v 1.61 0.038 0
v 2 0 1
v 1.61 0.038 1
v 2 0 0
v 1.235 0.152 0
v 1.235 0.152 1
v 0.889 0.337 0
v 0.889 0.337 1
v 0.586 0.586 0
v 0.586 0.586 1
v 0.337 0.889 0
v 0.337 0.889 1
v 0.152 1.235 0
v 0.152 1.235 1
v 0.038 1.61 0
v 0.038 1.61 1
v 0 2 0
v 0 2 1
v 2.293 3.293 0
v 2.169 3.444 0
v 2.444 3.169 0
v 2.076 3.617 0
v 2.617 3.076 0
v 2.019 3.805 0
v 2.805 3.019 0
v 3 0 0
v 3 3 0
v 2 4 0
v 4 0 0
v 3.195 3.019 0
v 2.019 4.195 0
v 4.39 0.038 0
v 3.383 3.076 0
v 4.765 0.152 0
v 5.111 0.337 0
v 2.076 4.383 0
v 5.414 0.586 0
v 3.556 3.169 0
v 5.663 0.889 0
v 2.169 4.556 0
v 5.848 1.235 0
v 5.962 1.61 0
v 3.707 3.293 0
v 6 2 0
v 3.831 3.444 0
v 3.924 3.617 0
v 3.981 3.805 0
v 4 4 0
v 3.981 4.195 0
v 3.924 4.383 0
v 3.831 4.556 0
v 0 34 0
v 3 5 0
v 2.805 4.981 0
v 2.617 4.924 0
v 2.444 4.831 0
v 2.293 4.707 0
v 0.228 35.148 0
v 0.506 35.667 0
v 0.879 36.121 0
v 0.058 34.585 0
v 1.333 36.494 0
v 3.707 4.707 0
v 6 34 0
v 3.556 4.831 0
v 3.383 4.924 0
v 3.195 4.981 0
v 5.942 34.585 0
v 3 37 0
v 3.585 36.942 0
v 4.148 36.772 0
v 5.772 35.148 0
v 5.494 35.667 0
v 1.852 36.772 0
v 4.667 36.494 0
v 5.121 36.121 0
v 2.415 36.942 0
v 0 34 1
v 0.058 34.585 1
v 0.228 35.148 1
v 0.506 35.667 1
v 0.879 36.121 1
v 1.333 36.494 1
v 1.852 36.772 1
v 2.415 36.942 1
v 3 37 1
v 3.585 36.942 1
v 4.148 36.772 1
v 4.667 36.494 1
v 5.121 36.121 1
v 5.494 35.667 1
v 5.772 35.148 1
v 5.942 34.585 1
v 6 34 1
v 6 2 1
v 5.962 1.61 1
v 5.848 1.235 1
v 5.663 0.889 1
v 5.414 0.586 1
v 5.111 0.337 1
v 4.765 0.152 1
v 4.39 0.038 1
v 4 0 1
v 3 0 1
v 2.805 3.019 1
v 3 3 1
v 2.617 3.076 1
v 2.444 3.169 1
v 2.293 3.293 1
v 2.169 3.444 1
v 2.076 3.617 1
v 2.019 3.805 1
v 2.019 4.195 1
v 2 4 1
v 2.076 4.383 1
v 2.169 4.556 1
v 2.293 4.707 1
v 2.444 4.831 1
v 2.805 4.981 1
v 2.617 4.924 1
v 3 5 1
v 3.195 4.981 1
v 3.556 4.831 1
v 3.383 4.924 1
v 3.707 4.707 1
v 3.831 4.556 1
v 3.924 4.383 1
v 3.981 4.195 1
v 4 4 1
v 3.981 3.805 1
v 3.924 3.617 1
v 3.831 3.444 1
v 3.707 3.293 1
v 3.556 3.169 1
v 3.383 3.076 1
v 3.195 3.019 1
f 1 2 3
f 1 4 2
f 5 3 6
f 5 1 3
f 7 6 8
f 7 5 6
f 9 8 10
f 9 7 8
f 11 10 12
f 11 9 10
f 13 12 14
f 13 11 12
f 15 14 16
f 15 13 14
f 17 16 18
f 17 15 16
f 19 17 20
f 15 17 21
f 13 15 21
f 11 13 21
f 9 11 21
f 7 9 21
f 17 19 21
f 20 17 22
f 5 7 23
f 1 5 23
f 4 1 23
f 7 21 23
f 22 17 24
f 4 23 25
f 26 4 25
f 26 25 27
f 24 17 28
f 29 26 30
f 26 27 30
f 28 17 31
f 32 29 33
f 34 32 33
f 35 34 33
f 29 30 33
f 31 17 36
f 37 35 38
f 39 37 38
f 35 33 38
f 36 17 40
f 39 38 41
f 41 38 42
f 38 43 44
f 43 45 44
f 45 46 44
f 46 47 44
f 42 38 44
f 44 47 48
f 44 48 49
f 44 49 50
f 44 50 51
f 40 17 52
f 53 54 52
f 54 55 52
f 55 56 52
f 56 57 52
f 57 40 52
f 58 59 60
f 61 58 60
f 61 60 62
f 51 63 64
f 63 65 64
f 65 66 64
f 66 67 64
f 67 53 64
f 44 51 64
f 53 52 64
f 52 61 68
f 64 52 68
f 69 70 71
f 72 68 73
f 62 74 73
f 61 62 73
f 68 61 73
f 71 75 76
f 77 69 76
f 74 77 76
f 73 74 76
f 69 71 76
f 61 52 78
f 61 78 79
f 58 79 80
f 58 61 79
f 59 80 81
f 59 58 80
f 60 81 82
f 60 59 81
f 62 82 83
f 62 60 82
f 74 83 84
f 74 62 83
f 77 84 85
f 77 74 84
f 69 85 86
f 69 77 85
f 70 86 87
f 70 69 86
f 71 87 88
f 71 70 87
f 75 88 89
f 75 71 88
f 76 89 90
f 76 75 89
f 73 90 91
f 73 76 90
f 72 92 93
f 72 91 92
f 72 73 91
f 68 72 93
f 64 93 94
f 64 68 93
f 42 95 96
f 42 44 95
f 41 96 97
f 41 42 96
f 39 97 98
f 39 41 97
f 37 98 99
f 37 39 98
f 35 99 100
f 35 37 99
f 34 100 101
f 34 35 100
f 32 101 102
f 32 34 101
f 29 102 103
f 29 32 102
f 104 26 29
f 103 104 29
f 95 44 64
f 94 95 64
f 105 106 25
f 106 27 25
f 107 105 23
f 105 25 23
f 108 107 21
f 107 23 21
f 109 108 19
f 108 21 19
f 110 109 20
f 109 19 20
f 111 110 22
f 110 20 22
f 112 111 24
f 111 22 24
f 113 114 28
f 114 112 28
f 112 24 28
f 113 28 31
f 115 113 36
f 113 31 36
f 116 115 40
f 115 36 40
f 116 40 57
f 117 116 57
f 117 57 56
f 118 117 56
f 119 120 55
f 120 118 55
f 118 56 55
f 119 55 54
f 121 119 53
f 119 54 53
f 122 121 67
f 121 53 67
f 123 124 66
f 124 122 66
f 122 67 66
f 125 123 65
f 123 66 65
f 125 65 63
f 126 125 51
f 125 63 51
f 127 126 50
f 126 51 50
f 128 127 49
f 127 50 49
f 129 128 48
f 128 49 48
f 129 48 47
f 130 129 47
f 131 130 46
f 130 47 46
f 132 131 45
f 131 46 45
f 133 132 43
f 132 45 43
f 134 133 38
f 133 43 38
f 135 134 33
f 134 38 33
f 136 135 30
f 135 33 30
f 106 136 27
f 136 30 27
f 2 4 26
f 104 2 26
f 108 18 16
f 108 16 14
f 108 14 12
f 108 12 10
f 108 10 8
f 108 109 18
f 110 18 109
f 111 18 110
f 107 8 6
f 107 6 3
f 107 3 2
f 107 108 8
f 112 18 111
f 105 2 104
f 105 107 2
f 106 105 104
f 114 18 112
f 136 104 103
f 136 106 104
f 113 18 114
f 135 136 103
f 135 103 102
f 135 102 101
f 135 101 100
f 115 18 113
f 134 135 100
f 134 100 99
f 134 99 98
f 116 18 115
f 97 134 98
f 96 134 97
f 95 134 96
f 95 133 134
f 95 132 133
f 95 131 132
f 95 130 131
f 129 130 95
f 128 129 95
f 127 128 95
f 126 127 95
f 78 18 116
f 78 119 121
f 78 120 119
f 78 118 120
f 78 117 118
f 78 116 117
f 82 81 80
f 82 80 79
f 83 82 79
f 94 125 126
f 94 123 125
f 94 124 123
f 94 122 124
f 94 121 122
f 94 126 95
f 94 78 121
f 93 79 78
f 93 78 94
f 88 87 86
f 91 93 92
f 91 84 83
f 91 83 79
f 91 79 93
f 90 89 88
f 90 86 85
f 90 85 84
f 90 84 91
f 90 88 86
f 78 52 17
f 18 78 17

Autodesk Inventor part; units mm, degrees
ref_plane "YZ Plane" through (0, 0, 0) normal (1, 0, 0) x (0, 1, 0)
ref_plane "XZ Plane" through (0, 0, 0) normal (0, 1, 0) x (-1, 0, 0)
ref_plane "XY Plane" through (0, 0, 0) normal (0, 0, 1) x (1, 0, 0)
sketch "Boceto1" plane through (0, 0, 0) normal (0, 0, 1) x (1, 0, 0)
  line L0 (2, 0) -> (4, 0)
  line L1 (6, 2) -> (6, 34)
  line L2 (3, 0) -> (3, 4)
  circle A0 centre (3, 4) radius 1
  arc A1 (6, 34) -> (0, 34) centre (3, 34) ccw
  line L3 (0, 34) -> (0, 2)
  arc A2 (0, 2) -> (2, 0) centre (2, 2) ccw
  arc A3 (4, 0) -> (6, 2) centre (4, 2) ccw
  point P0 (0, 0)
  point P1 (6, 0)
  dimension "d2" = 4
  dimension "d3" = 2
  dimension "d6" = 2
  dimension "d7" = 6
  dimension "d8" = 37
extrude "Extrusión1" add sketch "Boceto1" along normal blind 1
equation "\"thikness\" = 2"
equation "\"offset\" = 1"
equation "\"r1\" = 5.55"
equation "\"r2o\" = 59.75"
equation "\"delta_y\" = 6"
equation "\"wire_d\" = 1"
equation "\"width_ang_spring\" = 5"
equation "\"spring_int_diam\" = 8.5"
equation "\"spring_ext_diam\" = 10.5"
equation "\"r3\" = 8.25"
equation "\"r3R\" = 4.75"
equation "\"r3T\" = 6.74537"
equation "\"alpha\" = 54.847297deg"
equation "\"alpha2\" = 270deg"
equation "\"theta3_recogido\" = 305.152703deg"
equation "\"delta_theta_3\" = 45deg"
equation "\"joint_width\" = 12"
equation "\"joint_radius\" = 7.75"
equation "\"shaft_width\" = 15"
equation "\"shaft_joint_diameter\" = 7.75"
equation "\"separation_space\" = 0.5"
equation "\"height_finger\" = 42"
equation "\"cell_screw_head_diameter\" = 4"
equation "\"cell_screw_diameter\" = 2"
equation "\"cell_space\" = 2"
equation "\"cell_width\" = 6"
equation "\"cell_theta_position\" = 60deg"
equation "\"cell_thikness\" = 1"
equation "\"cell_lenght\" = 37"
equation "\"cell_z_space\" = 5"
equation "\"wire_D\" = 2.3"
equation "\"width_link\" = 8"
equation "\"Dt\" = 1.05949"
equation "\"Djoint_shaft\" = 2.3"
equation "\"shaft_x\" = 1.45"
equation "\"shaft_y\" = 6.45"
equation "\"lenght_body_link\" = 186.05"
equation "\"lenght_bar_support\" = 201.65"
equation "\"wire_spring_d\" = 1"
equation "\"spring_int_d\" = 6"
equation "\"spring_lenght\" = 28"
equation "\"trigger_offset\" = 2"
equation "\"m2_theta2o\" = 107deg"
equation "\"m2_r2\" = 28"
equation "\"e\" = 9"
equation "\"So\" = 17"
equation "\"m2_theta3o\" = -30deg"
equation "\"m2_r3\" = 19.75"
equation "\"m2_delta_theta1\" = 15deg"
equation "\"m2_theta3f\" = -60deg"
equation "\"trigger_thumb_lenght\" = 6"
equation "\"width_r12\" = 8"
equation "\"m2_r1\" = 25.2"
equation "\"r3_thikness\" = 3.5"
equation "\"t_thikness\" = 3"
equation "\"tg_width\" = 4"
equation "\"pivot_screw_d\" = 4"
equation "\"pivot_diameter\" = 7"
equation "\"sj_diam_shaft\" = 6"
equation "\"sj_groove\" = 2"
equation "\"sj_groove_deep\" = 7"
equation "\"sj_head_D\" = 7"
equation "\"sj_head_d\" = 4.7464"
equation "\"sj_head_height\" = 5"
equation "\"sf_lenght\" = 9.5"
equation "\"sf_base\" = 3"
equation "\"sf_head_height\" = 3"
equation "\"sf_head_width\" = 4.5"
equation "\"sf_head_offset\" = 0.25"
equation "\"sf_head_grip_width\" = 2"
equation "\"sf_head_angle\" = 45deg"
equation "\"sf_thikness\" = 5"
equation "\"screw_Dhead\" = 8"
equation "\"screw_d\" = 4"
equation "\"screw_lenght\" = 12"
equation "\"screwJ_base_D\" = 9"
equation "\"screwJ_top_D\" = 13"
equation "\"gj_D\" = 6"
equation "\"gj_d\" = 4"
equation "\"gj_out_section\" = 6"
equation "\"ext_width_slider\" = 3.5"
equation "\"sfbox_tip_width\" = 2.5"
equation "\"slim_width_slider\" = 1.5"
equation "\"agarradera_width\" = 4"
equation "\"int_width_slider\" = 2"
equation "\"agarradera_position\" = 82.13077"
equation "\"sfbox_theta1\" = 60deg"
equation "\"sfbox_theta2\" = 45deg"
equation "\"agarradera_theta\" = 60deg"
equation "\"sfbox_width\" = 1.5"
equation "\"box_fat_slider_lenght\" = 67"
equation "\"fat_width_slider\" = 2"
equation "\"box_in_width\" = 72"
equation "\"flex_separation_theta\" = 60deg"
equation "\"sf_flex_separation\" = 38.66667"
equation "\"thikness_box\" = 1.5"
equation "\"box_slim_slider_lenght\" = 116"
equation "\"box_in_deep\" = 77"
equation "\"box_in_height\" = 35"
properties part number "celda de carga"
